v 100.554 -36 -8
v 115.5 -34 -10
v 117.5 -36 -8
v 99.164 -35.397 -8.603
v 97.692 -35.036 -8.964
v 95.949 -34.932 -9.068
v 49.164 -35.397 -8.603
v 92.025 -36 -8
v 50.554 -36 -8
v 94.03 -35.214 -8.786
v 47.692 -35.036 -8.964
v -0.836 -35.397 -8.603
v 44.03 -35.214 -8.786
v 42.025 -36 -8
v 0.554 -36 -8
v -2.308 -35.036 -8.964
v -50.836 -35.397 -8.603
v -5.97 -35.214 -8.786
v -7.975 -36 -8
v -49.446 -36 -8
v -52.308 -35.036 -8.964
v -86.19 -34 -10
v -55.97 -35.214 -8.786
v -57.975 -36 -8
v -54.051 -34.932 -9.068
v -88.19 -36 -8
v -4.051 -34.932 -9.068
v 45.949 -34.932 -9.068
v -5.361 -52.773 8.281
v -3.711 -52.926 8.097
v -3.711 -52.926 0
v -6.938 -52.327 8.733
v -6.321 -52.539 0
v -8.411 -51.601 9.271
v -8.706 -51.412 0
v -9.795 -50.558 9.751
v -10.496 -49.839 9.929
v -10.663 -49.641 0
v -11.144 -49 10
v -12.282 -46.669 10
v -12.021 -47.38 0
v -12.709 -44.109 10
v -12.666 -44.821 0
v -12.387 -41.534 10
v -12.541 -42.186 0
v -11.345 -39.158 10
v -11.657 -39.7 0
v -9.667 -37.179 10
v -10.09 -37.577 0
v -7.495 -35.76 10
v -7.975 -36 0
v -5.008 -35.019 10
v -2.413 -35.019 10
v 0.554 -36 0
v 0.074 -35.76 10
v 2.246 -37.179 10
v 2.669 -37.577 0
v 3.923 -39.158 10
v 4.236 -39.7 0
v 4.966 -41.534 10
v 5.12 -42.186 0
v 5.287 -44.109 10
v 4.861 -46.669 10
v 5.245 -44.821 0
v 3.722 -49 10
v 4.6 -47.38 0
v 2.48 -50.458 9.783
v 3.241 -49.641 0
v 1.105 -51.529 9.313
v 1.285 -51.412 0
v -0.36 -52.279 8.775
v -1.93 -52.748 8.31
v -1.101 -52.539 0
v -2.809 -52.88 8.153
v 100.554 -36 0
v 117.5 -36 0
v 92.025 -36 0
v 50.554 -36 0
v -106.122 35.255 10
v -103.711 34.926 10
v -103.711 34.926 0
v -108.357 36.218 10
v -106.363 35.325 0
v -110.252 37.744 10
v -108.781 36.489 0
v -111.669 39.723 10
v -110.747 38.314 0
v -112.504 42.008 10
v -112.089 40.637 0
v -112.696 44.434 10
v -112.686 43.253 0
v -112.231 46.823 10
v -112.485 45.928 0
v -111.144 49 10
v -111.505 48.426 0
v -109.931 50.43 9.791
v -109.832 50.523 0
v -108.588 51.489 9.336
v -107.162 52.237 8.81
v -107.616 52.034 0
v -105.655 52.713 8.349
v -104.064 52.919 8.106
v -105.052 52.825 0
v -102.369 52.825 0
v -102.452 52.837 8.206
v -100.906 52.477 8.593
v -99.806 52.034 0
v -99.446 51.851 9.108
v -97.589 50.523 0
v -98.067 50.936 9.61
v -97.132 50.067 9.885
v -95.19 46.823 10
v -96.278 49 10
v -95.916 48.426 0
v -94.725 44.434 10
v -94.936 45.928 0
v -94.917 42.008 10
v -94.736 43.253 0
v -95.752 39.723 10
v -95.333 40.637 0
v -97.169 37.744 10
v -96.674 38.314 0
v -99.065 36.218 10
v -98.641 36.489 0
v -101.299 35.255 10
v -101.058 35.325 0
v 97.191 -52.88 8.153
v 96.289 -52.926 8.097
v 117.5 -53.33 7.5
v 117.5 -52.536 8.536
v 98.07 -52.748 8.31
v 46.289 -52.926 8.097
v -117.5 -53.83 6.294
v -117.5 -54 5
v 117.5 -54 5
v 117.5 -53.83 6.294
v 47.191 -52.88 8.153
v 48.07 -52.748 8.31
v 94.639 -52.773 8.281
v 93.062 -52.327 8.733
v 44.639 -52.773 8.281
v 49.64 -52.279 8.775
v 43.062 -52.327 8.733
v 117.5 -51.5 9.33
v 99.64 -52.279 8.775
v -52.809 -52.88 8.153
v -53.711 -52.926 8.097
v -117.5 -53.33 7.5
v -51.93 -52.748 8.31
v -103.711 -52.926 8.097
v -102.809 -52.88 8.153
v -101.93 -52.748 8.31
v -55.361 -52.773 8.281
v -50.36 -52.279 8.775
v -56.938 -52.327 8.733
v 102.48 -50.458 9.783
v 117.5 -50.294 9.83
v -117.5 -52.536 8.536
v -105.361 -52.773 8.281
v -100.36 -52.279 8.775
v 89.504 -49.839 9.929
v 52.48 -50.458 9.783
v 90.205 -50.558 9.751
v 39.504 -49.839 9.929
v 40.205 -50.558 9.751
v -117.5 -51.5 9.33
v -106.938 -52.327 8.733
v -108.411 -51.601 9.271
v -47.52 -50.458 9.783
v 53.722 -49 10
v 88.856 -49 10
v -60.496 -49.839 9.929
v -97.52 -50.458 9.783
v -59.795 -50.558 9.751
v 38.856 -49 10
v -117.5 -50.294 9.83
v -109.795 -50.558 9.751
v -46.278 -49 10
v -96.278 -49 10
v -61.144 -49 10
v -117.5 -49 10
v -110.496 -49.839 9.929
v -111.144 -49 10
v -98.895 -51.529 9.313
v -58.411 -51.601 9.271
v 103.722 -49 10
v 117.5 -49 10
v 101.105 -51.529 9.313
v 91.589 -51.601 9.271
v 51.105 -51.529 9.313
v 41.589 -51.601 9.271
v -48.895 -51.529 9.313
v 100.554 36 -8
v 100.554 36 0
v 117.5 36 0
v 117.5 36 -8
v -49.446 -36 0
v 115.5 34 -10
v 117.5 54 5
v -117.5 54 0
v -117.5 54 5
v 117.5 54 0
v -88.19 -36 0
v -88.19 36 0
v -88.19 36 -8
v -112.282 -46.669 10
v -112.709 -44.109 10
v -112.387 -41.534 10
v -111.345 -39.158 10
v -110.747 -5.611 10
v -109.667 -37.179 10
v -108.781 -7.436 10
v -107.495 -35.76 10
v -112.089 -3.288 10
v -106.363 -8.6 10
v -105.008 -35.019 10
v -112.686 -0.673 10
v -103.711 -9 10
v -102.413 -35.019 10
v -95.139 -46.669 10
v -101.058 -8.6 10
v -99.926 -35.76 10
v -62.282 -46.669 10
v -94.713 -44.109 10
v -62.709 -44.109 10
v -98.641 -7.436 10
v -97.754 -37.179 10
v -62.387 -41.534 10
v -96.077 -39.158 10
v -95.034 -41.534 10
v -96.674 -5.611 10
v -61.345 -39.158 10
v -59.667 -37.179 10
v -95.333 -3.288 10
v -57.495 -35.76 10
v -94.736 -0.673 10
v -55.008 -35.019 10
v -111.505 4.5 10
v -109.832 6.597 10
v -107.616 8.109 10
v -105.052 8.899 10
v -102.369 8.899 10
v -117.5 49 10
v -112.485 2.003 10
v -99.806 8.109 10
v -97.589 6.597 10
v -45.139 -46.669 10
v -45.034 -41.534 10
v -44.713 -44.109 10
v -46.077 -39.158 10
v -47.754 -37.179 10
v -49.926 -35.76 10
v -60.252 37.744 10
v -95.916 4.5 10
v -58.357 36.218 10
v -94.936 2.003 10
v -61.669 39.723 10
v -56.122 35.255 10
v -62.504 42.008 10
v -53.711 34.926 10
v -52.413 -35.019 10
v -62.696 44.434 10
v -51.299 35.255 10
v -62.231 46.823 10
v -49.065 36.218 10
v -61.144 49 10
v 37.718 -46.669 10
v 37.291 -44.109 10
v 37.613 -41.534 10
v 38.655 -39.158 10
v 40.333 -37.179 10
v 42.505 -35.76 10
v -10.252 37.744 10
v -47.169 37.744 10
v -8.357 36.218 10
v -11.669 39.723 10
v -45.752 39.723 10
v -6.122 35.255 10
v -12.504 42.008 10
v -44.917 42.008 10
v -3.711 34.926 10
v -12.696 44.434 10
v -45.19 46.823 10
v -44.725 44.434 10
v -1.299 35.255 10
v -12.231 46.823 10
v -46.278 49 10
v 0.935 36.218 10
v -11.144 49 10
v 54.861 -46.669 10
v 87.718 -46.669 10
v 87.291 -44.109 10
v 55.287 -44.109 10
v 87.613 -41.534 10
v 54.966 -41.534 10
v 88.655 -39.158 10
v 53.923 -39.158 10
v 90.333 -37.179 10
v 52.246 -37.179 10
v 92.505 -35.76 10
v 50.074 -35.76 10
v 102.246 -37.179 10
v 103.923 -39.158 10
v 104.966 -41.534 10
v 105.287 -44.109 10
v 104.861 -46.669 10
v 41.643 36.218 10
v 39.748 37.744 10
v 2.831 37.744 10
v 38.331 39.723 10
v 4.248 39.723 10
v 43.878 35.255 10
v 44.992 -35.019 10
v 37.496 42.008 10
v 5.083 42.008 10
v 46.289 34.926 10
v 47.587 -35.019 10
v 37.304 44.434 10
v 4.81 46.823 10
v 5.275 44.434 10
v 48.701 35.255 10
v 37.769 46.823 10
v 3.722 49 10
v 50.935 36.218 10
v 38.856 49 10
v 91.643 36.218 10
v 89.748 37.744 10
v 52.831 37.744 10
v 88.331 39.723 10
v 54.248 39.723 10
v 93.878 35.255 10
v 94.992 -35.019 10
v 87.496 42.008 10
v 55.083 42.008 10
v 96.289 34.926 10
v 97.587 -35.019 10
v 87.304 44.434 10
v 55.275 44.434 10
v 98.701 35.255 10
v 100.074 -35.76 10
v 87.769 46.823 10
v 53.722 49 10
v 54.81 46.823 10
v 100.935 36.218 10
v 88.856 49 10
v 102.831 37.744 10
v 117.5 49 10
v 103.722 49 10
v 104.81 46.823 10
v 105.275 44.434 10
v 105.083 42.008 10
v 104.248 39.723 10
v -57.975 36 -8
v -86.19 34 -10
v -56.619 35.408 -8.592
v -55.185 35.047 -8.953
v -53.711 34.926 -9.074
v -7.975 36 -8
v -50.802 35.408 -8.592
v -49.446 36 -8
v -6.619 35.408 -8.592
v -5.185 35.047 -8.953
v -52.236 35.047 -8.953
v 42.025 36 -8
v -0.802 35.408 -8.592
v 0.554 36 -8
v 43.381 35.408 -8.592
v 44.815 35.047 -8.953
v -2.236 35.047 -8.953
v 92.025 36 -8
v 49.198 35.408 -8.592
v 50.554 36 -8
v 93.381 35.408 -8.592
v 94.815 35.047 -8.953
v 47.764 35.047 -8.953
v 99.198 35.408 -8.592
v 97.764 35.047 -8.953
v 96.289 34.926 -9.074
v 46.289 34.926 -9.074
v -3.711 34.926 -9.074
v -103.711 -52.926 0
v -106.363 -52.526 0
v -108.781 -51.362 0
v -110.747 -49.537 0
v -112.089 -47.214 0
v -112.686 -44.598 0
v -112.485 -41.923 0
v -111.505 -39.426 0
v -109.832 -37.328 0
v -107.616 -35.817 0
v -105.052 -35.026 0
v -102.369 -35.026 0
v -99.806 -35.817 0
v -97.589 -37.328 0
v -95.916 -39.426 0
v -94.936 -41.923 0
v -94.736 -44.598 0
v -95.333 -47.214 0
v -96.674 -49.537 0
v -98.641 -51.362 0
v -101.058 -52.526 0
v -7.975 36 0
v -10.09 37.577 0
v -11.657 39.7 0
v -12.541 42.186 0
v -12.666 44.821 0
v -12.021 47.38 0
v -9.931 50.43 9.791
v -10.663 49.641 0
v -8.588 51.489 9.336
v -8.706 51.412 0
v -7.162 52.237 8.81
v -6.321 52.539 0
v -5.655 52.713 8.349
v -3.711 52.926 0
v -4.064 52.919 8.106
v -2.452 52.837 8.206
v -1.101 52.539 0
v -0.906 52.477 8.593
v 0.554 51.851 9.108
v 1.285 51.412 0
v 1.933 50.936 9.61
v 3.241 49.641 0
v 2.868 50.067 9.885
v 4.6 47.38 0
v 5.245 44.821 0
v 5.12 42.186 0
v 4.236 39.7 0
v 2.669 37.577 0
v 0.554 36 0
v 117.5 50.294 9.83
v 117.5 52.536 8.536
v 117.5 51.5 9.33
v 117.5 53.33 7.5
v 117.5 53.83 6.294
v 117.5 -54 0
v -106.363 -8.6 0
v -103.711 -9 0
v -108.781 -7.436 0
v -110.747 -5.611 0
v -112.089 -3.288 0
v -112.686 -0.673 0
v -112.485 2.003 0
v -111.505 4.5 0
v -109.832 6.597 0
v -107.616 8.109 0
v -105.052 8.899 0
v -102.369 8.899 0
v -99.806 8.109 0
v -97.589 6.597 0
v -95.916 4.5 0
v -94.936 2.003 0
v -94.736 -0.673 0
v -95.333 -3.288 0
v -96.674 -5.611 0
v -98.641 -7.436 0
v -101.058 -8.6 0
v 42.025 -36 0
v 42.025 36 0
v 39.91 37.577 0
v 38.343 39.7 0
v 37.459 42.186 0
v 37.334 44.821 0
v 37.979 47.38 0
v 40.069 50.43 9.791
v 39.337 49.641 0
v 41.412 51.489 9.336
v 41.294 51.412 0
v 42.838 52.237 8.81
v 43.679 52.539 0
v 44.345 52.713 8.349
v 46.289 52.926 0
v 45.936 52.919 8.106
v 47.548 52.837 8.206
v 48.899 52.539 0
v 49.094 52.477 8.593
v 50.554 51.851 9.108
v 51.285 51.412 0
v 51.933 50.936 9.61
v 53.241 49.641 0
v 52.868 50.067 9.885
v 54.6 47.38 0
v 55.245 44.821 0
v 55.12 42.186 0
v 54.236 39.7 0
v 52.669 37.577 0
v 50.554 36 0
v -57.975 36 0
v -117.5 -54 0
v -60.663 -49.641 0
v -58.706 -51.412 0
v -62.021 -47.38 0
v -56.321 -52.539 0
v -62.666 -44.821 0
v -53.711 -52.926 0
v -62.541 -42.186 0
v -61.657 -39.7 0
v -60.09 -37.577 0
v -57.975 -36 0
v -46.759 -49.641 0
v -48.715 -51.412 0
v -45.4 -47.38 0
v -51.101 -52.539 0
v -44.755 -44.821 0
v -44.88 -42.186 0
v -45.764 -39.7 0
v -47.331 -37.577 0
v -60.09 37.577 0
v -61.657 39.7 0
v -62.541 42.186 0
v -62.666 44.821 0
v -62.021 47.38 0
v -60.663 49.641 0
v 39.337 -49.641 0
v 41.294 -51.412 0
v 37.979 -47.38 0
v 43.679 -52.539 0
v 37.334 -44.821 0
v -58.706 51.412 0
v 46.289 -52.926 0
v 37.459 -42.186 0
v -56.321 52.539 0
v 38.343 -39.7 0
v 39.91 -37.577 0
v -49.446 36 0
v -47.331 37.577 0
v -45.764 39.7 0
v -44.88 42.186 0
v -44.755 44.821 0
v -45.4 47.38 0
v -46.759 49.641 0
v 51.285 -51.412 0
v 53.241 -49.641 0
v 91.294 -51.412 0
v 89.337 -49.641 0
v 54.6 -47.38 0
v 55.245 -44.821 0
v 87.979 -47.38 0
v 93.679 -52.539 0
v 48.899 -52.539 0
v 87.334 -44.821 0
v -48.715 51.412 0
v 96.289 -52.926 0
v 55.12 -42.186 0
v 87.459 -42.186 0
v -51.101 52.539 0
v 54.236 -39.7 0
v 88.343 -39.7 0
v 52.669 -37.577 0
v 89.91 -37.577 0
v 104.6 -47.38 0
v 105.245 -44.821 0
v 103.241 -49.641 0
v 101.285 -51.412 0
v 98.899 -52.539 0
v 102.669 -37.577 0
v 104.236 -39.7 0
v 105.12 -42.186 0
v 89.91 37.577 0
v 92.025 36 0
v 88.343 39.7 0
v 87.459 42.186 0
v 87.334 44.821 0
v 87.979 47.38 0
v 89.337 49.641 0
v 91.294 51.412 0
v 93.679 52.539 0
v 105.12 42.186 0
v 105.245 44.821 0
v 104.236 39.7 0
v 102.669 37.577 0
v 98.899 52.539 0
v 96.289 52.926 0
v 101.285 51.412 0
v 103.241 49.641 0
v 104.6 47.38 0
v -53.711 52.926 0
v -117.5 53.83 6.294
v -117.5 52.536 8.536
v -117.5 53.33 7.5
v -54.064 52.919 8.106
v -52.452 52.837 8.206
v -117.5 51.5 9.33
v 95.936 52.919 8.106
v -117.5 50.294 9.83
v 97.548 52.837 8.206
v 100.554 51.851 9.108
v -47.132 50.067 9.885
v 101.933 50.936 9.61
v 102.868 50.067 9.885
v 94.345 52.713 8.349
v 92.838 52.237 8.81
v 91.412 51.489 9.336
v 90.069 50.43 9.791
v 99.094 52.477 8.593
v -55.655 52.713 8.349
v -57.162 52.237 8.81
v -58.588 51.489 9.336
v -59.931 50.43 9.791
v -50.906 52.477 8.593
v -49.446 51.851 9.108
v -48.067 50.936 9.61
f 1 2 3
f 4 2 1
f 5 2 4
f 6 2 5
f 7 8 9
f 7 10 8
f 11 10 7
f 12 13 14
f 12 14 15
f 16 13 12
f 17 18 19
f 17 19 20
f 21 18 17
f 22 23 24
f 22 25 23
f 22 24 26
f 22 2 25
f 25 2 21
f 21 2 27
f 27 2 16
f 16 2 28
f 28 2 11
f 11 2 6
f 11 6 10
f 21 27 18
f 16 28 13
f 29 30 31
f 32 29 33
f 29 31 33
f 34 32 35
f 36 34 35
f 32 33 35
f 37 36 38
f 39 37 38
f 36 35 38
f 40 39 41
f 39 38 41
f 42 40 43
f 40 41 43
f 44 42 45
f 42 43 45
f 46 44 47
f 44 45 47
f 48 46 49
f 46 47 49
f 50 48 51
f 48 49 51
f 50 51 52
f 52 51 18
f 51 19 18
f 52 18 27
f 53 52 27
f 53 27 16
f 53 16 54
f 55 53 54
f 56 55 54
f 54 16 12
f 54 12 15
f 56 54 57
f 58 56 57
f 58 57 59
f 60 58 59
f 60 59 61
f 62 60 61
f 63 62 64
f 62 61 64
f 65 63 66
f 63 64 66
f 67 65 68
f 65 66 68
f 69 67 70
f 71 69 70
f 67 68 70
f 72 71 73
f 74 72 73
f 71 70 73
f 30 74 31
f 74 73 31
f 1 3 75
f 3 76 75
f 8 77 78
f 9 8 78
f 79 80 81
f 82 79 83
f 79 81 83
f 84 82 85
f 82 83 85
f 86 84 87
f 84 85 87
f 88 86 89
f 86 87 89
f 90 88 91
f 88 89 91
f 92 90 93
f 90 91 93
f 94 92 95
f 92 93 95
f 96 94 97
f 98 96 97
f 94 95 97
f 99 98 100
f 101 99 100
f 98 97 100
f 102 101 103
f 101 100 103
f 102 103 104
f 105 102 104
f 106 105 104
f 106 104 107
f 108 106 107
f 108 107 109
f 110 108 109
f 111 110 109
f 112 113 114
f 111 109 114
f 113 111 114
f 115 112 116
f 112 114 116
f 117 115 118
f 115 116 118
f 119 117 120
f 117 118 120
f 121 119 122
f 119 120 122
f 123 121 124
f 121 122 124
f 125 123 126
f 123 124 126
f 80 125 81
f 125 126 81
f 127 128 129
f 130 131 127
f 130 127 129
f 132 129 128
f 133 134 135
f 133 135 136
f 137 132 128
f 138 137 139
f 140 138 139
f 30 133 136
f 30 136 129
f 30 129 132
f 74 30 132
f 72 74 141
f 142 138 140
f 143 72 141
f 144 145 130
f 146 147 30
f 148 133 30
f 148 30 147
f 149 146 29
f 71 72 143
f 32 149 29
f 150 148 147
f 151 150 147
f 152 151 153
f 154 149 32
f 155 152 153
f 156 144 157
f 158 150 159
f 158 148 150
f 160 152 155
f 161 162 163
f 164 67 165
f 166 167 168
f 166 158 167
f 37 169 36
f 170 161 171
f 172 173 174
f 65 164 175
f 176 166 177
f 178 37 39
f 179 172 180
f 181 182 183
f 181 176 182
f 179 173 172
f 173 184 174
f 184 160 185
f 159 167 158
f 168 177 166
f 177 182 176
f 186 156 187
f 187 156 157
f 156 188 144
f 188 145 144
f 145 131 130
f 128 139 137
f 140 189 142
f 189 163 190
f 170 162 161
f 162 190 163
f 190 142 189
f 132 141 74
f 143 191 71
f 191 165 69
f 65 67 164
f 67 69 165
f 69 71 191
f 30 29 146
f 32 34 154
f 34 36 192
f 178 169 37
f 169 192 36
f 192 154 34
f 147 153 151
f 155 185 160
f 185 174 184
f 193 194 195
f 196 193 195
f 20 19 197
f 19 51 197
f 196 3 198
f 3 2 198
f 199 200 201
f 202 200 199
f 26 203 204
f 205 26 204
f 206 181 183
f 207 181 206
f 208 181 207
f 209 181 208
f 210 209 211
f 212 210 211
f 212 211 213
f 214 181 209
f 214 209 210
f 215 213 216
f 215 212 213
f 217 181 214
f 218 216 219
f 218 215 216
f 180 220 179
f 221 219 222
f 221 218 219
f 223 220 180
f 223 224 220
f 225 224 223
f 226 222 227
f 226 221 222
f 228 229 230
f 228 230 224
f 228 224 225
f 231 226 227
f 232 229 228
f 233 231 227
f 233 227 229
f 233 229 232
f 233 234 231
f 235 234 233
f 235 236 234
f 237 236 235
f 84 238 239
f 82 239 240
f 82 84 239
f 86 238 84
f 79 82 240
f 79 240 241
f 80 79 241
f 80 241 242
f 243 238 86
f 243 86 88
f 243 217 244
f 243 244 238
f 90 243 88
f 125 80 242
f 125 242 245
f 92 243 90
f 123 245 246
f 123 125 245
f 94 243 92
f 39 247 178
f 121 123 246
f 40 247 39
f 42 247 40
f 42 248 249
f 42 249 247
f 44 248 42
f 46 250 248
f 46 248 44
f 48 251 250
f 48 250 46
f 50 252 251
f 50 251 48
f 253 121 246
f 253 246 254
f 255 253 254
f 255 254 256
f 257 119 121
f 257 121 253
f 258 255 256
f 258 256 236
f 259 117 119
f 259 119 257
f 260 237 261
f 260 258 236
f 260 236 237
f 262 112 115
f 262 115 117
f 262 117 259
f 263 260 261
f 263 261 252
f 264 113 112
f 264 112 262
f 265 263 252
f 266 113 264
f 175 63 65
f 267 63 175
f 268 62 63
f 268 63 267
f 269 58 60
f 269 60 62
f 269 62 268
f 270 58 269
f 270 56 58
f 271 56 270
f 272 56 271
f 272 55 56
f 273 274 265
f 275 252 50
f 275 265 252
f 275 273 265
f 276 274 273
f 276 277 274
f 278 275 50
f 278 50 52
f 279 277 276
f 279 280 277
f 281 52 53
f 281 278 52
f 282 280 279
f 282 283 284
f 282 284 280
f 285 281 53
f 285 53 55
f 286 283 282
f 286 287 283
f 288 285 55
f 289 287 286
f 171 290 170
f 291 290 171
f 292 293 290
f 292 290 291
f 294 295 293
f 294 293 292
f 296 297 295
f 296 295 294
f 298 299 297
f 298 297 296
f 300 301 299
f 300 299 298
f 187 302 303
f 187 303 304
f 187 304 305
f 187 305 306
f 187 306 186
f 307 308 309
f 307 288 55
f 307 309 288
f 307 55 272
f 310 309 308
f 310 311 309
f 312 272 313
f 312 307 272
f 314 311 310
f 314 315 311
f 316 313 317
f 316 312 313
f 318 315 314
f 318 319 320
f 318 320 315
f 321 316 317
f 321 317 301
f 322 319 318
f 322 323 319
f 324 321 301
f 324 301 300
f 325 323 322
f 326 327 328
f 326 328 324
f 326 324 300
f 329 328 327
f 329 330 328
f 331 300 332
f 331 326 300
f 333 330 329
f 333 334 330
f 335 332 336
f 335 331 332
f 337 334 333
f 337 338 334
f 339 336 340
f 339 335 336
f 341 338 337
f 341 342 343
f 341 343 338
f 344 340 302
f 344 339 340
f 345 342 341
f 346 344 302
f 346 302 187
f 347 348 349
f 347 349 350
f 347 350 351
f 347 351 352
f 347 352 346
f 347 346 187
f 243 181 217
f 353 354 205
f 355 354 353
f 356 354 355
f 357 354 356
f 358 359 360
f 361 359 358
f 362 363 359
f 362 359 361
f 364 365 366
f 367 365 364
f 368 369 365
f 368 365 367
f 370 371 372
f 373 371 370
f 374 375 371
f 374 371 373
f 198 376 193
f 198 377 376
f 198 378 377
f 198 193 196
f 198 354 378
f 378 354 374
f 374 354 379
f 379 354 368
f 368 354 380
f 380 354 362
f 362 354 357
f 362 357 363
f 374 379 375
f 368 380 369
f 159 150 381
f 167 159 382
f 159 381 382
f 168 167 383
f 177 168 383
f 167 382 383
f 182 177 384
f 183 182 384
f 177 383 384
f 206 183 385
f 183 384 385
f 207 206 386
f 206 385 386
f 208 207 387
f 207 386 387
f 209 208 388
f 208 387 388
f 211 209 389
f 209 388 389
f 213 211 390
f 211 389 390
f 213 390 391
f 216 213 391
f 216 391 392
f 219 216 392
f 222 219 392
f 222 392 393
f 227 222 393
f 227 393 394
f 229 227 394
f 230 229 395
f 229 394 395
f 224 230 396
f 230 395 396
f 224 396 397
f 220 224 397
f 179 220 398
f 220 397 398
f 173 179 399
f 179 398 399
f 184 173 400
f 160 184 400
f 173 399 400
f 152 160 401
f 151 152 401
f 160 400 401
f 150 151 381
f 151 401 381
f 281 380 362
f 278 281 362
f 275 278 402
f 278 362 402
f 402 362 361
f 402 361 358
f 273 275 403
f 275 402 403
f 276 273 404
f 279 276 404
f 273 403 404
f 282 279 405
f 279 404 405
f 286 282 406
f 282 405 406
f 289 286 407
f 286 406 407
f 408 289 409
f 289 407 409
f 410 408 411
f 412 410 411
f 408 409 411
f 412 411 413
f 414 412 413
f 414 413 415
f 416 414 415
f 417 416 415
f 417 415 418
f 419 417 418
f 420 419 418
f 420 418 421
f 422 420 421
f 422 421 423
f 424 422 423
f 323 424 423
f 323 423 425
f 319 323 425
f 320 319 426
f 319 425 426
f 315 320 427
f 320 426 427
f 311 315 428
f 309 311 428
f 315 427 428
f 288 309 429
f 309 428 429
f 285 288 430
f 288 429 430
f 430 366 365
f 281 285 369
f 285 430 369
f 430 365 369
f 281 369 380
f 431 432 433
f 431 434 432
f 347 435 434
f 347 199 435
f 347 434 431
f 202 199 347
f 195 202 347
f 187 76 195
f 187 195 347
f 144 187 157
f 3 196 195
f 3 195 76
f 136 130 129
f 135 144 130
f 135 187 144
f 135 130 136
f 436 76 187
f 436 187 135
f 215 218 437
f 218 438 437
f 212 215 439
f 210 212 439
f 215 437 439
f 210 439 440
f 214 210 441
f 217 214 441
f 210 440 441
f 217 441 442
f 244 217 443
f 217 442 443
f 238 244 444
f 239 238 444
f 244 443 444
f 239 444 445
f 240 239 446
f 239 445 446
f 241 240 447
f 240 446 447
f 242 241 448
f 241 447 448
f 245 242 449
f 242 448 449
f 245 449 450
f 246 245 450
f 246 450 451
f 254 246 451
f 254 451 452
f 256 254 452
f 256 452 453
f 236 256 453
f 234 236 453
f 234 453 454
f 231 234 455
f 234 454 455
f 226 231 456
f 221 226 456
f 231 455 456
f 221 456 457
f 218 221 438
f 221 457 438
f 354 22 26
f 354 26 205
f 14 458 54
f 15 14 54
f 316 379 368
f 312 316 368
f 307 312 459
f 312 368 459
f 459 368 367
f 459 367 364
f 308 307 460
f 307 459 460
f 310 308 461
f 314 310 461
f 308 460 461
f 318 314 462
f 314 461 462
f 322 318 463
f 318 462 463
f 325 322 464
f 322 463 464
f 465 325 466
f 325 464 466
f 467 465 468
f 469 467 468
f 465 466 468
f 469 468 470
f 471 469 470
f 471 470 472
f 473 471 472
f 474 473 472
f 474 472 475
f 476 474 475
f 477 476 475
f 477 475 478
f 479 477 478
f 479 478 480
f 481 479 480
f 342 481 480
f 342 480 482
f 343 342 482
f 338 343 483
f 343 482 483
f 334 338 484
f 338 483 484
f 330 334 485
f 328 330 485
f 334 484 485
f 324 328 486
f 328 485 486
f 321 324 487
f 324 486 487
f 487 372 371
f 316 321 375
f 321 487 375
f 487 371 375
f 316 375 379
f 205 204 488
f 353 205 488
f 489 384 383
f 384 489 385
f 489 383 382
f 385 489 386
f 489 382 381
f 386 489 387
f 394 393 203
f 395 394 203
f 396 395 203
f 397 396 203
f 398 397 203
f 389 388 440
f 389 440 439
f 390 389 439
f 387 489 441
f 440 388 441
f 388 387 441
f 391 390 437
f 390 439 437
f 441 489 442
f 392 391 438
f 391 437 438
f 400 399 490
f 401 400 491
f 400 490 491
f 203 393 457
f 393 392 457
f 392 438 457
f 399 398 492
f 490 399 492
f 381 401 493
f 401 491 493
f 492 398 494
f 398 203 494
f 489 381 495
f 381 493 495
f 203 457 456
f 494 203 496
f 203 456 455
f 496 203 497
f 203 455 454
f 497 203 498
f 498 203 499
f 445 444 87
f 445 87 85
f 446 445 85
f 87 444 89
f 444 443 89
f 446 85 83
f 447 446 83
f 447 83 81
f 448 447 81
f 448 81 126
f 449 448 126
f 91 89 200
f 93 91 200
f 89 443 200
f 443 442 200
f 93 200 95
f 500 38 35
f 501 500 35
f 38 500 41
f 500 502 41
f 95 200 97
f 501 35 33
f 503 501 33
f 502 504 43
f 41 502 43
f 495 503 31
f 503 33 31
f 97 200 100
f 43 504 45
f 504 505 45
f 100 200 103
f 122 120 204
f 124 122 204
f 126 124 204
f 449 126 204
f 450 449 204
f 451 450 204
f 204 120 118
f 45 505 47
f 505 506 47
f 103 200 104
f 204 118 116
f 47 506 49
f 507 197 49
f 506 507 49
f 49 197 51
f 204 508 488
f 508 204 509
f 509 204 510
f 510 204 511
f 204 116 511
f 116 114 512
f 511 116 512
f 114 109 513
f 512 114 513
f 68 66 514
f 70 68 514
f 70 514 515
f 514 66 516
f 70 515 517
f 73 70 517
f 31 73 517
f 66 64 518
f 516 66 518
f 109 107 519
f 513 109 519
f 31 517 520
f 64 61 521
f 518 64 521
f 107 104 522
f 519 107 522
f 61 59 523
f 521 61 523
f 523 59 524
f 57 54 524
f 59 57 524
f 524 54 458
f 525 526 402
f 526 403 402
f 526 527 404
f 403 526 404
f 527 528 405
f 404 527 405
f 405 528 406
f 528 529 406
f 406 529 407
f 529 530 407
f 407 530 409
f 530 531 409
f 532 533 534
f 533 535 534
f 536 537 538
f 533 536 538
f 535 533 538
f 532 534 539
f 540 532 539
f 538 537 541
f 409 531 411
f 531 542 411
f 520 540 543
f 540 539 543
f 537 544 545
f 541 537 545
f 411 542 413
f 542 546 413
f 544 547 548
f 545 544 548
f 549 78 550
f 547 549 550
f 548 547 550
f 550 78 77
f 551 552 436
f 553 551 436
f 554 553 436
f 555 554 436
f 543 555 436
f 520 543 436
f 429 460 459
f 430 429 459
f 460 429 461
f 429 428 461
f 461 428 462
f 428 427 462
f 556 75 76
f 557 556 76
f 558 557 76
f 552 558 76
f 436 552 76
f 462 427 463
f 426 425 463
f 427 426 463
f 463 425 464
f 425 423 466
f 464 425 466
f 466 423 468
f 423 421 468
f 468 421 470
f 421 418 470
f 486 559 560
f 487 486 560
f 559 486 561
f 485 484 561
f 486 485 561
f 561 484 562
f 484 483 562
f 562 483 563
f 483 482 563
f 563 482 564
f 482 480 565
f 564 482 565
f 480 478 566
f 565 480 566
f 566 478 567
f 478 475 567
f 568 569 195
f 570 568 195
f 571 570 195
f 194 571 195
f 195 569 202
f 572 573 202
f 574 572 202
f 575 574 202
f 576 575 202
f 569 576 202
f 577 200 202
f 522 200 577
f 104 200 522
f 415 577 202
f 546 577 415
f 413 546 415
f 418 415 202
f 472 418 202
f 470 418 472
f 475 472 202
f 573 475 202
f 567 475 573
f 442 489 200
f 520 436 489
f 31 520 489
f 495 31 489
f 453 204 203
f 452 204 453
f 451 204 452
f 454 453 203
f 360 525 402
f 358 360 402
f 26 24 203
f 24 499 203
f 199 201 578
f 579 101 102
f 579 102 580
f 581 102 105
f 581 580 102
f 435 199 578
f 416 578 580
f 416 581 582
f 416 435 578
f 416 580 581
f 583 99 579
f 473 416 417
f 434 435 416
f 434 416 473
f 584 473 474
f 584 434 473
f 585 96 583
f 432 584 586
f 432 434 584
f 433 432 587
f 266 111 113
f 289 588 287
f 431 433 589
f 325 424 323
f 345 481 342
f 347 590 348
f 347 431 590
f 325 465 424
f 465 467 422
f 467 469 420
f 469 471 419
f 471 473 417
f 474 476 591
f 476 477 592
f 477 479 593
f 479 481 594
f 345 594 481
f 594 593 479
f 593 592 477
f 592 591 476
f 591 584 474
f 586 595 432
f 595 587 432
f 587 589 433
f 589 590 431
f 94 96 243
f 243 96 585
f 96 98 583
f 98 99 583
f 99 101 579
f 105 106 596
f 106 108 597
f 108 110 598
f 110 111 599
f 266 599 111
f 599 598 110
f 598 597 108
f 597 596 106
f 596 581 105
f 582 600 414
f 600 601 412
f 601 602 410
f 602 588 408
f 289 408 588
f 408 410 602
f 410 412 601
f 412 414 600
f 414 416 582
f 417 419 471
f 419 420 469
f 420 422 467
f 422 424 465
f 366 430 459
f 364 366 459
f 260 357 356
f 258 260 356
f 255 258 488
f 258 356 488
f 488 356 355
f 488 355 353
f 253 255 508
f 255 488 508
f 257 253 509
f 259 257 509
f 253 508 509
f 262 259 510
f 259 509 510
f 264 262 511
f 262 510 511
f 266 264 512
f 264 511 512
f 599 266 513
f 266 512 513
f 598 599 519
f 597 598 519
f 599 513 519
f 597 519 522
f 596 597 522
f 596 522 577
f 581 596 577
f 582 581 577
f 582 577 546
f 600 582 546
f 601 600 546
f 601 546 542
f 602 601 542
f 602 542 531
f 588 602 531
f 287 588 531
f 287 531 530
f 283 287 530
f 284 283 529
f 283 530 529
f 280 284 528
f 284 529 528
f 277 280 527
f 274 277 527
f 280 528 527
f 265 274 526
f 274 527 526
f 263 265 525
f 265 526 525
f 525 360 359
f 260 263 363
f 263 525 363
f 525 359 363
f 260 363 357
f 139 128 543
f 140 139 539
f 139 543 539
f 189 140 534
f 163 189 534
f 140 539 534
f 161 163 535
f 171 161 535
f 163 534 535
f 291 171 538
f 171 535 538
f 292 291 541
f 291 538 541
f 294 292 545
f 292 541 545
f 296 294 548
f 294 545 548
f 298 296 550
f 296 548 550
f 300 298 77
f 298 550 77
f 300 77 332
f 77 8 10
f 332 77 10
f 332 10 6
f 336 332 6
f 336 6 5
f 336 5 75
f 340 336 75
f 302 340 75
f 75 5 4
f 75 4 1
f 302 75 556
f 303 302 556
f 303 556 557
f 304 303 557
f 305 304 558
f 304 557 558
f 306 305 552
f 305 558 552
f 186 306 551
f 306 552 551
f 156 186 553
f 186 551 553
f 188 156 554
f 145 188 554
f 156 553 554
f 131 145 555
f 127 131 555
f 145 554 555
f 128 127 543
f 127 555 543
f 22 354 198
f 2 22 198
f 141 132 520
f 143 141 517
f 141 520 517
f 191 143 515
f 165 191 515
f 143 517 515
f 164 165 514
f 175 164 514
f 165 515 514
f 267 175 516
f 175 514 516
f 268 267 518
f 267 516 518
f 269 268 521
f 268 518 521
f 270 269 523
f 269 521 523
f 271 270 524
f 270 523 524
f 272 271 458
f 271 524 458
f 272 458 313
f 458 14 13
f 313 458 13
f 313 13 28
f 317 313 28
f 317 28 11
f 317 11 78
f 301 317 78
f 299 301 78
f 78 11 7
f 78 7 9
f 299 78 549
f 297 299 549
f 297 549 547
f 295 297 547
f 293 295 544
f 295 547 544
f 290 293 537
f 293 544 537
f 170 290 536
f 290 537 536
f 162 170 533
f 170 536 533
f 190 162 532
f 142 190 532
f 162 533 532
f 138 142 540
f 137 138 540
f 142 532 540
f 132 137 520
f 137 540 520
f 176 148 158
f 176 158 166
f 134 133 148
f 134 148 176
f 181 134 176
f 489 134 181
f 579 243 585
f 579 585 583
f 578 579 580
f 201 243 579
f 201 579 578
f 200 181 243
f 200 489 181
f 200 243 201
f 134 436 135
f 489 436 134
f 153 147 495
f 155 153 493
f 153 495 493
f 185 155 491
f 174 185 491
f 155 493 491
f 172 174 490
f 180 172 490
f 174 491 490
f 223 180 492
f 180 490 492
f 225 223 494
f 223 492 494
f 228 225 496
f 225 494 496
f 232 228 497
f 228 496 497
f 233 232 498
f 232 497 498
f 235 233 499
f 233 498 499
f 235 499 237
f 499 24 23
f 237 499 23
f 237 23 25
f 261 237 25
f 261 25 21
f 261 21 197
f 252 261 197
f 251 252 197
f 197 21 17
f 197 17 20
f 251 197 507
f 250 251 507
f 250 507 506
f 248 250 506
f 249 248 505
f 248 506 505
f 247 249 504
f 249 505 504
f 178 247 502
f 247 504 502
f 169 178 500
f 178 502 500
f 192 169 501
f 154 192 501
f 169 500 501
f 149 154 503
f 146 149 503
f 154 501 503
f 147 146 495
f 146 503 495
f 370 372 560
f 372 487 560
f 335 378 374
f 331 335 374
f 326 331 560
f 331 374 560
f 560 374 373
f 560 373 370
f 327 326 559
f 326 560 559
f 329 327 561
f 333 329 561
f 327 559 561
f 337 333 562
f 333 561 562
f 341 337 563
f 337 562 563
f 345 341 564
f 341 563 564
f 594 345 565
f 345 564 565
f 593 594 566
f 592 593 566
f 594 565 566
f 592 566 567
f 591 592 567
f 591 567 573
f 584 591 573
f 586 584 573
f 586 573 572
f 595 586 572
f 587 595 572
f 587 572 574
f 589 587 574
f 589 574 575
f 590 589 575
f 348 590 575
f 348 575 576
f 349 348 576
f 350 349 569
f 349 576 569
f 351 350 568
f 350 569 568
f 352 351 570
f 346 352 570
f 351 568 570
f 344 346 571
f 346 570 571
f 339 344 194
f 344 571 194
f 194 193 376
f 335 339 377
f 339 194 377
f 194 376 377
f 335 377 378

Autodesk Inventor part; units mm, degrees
ref_plane "YZ Plane" through (0, 0, 0) normal (1, 0, 0) x (0, 1, 0)
ref_plane "XZ Plane" through (0, 0, 0) normal (0, 1, 0) x (-1, 0, 0)
ref_plane "XY Plane" through (0, 0, 0) normal (0, 0, 1) x (1, 0, 0)
sketch "Sketch1" plane through (0, 0, 0) normal (0, 0, 1) x (1, 0, 0)
  line L0 (-117.5, 54) -> (117.5, 54)
  line L1 (117.5, 54) -> (117.5, -54)
  line L2 (117.5, -54) -> (-117.5, -54)
  line L3 (-117.5, -54) -> (-117.5, 54)
  line L4 (-88.19, 36) -> (117.5, 36)
  line L5 (117.5, 36) -> (117.5, -36)
  line L6 (117.5, -36) -> (-88.19, -36)
  line L7 (-88.19, -36) -> (-88.19, 36)
  point P0 (0, 0)
  point P1 (117.5, 0)
  point P2 (0, 54)
  point P3 (117.5, 0)
  point P4 (117.5, -36)
  dimension "d0" = 108
  dimension "d1" = 235
  dimension "d4" = 205.69
  dimension "d5" = 72
extrude "Extrusion2" add sketch "Sketch1" against normal blind 10 contours L1 L6 L7 L4
extrude "Extrusion3" add sketch "Sketch1" along normal blind 10
chamfer "Chamfer1" distance 2 angle 45 4 edges at (14.655, -36, -10) (14.655, 36, -10) (-88.19, 0, -10) (117.5, 0, -10)
fillet "Fillet1" radius 5 2 edges at (0, 54, 10) (0, -54, 10)
sketch "Sketch3" plane through (0, 0, 10) normal (0, 0, 1) x (1, 0, 0)
  line L0 (117.5, -49) -> (-117.5, -49) projected
  line L1 (-117.5, 49) -> (117.5, 49) projected
  line L2 (-117.5, -54) -> (117.5, -54) projected
  line L3 (117.5, 54) -> (-117.5, 54) projected
  line L4 (-117.5, 49) -> (-117.5, -49) projected
  line L5 (117.5, -49) -> (117.5, 49) projected
  point P0 (-103.7107, 43.9255)
  point P1 (-103.7107, 0)
  point P2 (-103.7107, -43.9255)
  point P3 (-117.5, 0)
  dimension "d18" = 98
  dimension "d19" = 108
  dimension "d20" = 87.851
  dimension "d21" = 43.9255
  dimension "d22" = 221.2107
hole "Hole1" at (-103.7107, 43.9255, 10) at (-103.7107, -43.9255, 10) direction (0, 0, -1) diameter 18 depth 50 tip angle 118
pattern_linear "Rectangular Pattern1" count 5 spacing 50 along (1, 0, 0) of "Hole1"
hole "Hole2" at (-103.7107, 0, 10) direction (0, 0, -1) diameter 18 depth 15 tip angle 118
equation "\"d21\" = 0.5 * d20"
properties part number "Cover part of robot arm bottom side" material "Steel, Alloy"
